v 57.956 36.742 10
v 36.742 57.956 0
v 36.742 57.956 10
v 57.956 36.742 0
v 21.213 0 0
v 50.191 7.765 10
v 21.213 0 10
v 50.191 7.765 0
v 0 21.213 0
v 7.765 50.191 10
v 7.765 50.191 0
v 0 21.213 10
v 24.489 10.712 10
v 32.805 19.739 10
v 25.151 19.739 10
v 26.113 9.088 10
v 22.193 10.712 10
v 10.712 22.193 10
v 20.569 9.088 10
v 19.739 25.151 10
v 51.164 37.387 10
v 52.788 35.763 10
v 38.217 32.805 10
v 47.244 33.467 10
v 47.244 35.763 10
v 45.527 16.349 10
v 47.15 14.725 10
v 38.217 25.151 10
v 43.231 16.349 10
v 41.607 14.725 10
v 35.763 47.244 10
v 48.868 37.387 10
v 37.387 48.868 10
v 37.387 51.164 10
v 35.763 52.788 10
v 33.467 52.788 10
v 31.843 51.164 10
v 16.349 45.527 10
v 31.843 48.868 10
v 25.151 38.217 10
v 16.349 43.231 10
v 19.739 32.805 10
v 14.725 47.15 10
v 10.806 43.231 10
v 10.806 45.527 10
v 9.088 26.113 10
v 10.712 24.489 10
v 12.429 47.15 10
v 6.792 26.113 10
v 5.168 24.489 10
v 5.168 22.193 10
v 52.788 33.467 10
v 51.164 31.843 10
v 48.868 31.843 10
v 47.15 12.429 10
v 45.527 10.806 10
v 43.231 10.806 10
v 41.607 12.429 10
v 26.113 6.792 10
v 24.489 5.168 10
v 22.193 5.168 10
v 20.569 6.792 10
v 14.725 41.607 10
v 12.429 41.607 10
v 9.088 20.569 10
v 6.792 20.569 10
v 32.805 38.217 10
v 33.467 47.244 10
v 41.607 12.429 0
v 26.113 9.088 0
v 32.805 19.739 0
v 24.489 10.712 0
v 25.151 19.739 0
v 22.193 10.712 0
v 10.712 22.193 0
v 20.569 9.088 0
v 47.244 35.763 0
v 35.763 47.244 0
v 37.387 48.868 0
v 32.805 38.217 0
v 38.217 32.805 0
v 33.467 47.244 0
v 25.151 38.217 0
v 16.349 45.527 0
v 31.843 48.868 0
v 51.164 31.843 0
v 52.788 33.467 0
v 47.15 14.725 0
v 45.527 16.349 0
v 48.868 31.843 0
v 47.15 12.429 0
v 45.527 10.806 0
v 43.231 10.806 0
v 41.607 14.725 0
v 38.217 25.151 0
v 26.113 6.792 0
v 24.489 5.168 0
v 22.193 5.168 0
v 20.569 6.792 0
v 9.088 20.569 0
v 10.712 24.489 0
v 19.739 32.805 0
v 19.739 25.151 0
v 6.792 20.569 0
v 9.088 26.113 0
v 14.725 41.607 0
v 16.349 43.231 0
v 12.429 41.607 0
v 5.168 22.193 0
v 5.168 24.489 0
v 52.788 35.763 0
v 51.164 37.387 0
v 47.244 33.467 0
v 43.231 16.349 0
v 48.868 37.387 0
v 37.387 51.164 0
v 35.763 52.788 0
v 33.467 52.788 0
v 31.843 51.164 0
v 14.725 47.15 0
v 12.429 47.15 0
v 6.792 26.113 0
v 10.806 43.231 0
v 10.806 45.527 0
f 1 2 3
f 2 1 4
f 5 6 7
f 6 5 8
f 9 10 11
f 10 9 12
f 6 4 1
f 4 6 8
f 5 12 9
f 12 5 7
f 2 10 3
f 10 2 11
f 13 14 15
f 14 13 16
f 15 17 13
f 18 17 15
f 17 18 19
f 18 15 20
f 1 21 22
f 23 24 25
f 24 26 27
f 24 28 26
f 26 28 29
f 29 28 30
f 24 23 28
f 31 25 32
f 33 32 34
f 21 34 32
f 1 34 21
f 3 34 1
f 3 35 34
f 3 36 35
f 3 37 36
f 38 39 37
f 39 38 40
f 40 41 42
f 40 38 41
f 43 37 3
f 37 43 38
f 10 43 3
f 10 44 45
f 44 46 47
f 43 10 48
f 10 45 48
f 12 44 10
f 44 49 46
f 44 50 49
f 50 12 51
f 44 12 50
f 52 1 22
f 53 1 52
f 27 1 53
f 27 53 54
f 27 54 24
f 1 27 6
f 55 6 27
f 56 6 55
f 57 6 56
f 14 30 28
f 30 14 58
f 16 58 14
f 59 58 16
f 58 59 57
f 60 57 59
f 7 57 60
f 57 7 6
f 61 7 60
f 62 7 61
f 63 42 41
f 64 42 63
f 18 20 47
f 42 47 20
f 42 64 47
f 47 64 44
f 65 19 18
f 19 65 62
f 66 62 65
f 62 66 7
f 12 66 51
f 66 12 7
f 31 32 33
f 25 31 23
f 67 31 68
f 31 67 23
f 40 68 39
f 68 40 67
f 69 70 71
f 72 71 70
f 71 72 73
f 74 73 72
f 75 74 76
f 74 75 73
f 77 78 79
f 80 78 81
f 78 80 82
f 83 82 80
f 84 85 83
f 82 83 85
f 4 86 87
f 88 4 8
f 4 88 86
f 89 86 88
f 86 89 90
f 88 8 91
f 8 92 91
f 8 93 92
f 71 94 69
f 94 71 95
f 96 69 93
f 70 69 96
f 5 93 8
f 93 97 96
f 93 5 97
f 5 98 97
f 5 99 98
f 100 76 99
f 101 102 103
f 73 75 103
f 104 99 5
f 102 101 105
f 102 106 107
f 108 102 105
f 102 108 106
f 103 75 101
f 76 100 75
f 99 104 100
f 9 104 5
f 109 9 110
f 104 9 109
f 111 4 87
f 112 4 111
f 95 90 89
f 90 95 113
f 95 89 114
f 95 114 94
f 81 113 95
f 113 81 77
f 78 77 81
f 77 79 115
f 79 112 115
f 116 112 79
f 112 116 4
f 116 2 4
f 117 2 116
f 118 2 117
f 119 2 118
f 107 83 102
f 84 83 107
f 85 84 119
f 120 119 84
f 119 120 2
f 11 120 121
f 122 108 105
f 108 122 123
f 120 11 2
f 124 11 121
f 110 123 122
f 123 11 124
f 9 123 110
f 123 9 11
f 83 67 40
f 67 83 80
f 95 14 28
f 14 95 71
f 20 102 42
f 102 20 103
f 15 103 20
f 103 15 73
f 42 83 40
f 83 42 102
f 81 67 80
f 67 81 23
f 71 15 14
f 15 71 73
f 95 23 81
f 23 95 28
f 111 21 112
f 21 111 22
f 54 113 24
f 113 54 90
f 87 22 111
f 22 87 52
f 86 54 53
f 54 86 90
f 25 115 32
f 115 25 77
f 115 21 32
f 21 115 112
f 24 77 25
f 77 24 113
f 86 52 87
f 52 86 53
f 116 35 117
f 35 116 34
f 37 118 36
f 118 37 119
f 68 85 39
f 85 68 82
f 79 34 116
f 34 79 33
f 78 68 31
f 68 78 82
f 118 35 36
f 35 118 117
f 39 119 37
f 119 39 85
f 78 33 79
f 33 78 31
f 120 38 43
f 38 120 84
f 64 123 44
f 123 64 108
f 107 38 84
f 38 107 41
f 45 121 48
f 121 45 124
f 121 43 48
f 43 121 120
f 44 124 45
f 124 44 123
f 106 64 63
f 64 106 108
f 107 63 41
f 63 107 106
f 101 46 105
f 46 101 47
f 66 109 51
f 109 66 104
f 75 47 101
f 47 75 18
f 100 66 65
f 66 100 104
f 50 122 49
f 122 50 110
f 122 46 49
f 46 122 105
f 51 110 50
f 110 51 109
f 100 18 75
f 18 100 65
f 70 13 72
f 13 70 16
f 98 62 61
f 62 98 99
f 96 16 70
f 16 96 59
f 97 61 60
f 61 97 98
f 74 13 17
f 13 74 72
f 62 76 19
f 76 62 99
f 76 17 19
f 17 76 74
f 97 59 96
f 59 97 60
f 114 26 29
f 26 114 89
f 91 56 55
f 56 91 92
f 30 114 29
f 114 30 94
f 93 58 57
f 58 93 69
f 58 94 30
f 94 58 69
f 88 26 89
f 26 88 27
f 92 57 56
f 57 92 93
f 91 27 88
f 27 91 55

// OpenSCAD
$fn = 32;

// ----------------------------------------------------------------------
// Polygon plate: 6-gon R30, 6 bolt windows
// ----------------------------------------------------------------------

// --- parameters (mm) ---
sides = 6;                // number of polygon sides
plate_r = 30;             // circumscribed radius of the polygon
bore_r = 10;              // centre bore radius
bolts = 6;                // number of bolt windows
ring_r = 21.78;           // bolt-circle radius
bolt_r = 3;               // bolt window radius
plate_t = 10;             // plate thickness, Z (extrusion height)

plate_d = 2 * plate_r;  // circumscribed diameter
bore_d = 2 * bore_r;  // centre bore diameter
bolt_d = 2 * bolt_r;  // bolt window diameter
ring_d = 2 * ring_r;  // bolt-circle diameter

profile = [[57.956, 36.742], [36.742, 57.956], [7.765, 50.191], [0, 21.213], [21.213, 0], [50.191, 7.765]];  // primary outline, 6 points, counter clockwise
void_1 = [[38.217, 32.805], [32.805, 38.217], [25.151, 38.217], [19.739, 32.805], [19.739, 25.151], [25.151, 19.739], [32.805, 19.739], [38.217, 25.151]];  // centre bore, 8 points
void_2 = [[52.788, 35.763], [51.164, 37.387], [48.868, 37.387], [47.244, 35.763], [47.244, 33.467], [48.868, 31.843], [51.164, 31.843], [52.788, 33.467]];  // bolt window 1, 8 points
void_3 = [[37.387, 51.164], [35.763, 52.788], [33.467, 52.788], [31.843, 51.164], [31.843, 48.868], [33.467, 47.244], [35.763, 47.244], [37.387, 48.868]];  // bolt window 2, 8 points
void_4 = [[16.349, 45.527], [14.725, 47.15], [12.429, 47.15], [10.806, 45.527], [10.806, 43.231], [12.429, 41.607], [14.725, 41.607], [16.349, 43.231]];  // bolt window 3, 8 points
void_5 = [[10.712, 24.489], [9.088, 26.113], [6.792, 26.113], [5.168, 24.489], [5.168, 22.193], [6.792, 20.569], [9.088, 20.569], [10.712, 22.193]];  // bolt window 4, 8 points
void_6 = [[26.113, 9.088], [24.489, 10.712], [22.193, 10.712], [20.569, 9.088], [20.569, 6.792], [22.193, 5.168], [24.489, 5.168], [26.113, 6.792]];  // bolt window 5, 8 points
void_7 = [[47.15, 14.725], [45.527, 16.349], [43.231, 16.349], [41.607, 14.725], [41.607, 12.429], [43.231, 10.806], [45.527, 10.806], [47.15, 12.429]];  // bolt window 6, 8 points

// --- the one profile operation ---
difference() {
  linear_extrude(height = plate_t) polygon(points = profile);
  translate([0, 0, -1])
    linear_extrude(height = plate_t + 2) polygon(points = void_1);
  translate([0, 0, -1])
    linear_extrude(height = plate_t + 2) polygon(points = void_2);
  translate([0, 0, -1])
    linear_extrude(height = plate_t + 2) polygon(points = void_3);
  translate([0, 0, -1])
    linear_extrude(height = plate_t + 2) polygon(points = void_4);
  translate([0, 0, -1])
    linear_extrude(height = plate_t + 2) polygon(points = void_5);
  translate([0, 0, -1])
    linear_extrude(height = plate_t + 2) polygon(points = void_6);
  translate([0, 0, -1])
    linear_extrude(height = plate_t + 2) polygon(points = void_7);
}
